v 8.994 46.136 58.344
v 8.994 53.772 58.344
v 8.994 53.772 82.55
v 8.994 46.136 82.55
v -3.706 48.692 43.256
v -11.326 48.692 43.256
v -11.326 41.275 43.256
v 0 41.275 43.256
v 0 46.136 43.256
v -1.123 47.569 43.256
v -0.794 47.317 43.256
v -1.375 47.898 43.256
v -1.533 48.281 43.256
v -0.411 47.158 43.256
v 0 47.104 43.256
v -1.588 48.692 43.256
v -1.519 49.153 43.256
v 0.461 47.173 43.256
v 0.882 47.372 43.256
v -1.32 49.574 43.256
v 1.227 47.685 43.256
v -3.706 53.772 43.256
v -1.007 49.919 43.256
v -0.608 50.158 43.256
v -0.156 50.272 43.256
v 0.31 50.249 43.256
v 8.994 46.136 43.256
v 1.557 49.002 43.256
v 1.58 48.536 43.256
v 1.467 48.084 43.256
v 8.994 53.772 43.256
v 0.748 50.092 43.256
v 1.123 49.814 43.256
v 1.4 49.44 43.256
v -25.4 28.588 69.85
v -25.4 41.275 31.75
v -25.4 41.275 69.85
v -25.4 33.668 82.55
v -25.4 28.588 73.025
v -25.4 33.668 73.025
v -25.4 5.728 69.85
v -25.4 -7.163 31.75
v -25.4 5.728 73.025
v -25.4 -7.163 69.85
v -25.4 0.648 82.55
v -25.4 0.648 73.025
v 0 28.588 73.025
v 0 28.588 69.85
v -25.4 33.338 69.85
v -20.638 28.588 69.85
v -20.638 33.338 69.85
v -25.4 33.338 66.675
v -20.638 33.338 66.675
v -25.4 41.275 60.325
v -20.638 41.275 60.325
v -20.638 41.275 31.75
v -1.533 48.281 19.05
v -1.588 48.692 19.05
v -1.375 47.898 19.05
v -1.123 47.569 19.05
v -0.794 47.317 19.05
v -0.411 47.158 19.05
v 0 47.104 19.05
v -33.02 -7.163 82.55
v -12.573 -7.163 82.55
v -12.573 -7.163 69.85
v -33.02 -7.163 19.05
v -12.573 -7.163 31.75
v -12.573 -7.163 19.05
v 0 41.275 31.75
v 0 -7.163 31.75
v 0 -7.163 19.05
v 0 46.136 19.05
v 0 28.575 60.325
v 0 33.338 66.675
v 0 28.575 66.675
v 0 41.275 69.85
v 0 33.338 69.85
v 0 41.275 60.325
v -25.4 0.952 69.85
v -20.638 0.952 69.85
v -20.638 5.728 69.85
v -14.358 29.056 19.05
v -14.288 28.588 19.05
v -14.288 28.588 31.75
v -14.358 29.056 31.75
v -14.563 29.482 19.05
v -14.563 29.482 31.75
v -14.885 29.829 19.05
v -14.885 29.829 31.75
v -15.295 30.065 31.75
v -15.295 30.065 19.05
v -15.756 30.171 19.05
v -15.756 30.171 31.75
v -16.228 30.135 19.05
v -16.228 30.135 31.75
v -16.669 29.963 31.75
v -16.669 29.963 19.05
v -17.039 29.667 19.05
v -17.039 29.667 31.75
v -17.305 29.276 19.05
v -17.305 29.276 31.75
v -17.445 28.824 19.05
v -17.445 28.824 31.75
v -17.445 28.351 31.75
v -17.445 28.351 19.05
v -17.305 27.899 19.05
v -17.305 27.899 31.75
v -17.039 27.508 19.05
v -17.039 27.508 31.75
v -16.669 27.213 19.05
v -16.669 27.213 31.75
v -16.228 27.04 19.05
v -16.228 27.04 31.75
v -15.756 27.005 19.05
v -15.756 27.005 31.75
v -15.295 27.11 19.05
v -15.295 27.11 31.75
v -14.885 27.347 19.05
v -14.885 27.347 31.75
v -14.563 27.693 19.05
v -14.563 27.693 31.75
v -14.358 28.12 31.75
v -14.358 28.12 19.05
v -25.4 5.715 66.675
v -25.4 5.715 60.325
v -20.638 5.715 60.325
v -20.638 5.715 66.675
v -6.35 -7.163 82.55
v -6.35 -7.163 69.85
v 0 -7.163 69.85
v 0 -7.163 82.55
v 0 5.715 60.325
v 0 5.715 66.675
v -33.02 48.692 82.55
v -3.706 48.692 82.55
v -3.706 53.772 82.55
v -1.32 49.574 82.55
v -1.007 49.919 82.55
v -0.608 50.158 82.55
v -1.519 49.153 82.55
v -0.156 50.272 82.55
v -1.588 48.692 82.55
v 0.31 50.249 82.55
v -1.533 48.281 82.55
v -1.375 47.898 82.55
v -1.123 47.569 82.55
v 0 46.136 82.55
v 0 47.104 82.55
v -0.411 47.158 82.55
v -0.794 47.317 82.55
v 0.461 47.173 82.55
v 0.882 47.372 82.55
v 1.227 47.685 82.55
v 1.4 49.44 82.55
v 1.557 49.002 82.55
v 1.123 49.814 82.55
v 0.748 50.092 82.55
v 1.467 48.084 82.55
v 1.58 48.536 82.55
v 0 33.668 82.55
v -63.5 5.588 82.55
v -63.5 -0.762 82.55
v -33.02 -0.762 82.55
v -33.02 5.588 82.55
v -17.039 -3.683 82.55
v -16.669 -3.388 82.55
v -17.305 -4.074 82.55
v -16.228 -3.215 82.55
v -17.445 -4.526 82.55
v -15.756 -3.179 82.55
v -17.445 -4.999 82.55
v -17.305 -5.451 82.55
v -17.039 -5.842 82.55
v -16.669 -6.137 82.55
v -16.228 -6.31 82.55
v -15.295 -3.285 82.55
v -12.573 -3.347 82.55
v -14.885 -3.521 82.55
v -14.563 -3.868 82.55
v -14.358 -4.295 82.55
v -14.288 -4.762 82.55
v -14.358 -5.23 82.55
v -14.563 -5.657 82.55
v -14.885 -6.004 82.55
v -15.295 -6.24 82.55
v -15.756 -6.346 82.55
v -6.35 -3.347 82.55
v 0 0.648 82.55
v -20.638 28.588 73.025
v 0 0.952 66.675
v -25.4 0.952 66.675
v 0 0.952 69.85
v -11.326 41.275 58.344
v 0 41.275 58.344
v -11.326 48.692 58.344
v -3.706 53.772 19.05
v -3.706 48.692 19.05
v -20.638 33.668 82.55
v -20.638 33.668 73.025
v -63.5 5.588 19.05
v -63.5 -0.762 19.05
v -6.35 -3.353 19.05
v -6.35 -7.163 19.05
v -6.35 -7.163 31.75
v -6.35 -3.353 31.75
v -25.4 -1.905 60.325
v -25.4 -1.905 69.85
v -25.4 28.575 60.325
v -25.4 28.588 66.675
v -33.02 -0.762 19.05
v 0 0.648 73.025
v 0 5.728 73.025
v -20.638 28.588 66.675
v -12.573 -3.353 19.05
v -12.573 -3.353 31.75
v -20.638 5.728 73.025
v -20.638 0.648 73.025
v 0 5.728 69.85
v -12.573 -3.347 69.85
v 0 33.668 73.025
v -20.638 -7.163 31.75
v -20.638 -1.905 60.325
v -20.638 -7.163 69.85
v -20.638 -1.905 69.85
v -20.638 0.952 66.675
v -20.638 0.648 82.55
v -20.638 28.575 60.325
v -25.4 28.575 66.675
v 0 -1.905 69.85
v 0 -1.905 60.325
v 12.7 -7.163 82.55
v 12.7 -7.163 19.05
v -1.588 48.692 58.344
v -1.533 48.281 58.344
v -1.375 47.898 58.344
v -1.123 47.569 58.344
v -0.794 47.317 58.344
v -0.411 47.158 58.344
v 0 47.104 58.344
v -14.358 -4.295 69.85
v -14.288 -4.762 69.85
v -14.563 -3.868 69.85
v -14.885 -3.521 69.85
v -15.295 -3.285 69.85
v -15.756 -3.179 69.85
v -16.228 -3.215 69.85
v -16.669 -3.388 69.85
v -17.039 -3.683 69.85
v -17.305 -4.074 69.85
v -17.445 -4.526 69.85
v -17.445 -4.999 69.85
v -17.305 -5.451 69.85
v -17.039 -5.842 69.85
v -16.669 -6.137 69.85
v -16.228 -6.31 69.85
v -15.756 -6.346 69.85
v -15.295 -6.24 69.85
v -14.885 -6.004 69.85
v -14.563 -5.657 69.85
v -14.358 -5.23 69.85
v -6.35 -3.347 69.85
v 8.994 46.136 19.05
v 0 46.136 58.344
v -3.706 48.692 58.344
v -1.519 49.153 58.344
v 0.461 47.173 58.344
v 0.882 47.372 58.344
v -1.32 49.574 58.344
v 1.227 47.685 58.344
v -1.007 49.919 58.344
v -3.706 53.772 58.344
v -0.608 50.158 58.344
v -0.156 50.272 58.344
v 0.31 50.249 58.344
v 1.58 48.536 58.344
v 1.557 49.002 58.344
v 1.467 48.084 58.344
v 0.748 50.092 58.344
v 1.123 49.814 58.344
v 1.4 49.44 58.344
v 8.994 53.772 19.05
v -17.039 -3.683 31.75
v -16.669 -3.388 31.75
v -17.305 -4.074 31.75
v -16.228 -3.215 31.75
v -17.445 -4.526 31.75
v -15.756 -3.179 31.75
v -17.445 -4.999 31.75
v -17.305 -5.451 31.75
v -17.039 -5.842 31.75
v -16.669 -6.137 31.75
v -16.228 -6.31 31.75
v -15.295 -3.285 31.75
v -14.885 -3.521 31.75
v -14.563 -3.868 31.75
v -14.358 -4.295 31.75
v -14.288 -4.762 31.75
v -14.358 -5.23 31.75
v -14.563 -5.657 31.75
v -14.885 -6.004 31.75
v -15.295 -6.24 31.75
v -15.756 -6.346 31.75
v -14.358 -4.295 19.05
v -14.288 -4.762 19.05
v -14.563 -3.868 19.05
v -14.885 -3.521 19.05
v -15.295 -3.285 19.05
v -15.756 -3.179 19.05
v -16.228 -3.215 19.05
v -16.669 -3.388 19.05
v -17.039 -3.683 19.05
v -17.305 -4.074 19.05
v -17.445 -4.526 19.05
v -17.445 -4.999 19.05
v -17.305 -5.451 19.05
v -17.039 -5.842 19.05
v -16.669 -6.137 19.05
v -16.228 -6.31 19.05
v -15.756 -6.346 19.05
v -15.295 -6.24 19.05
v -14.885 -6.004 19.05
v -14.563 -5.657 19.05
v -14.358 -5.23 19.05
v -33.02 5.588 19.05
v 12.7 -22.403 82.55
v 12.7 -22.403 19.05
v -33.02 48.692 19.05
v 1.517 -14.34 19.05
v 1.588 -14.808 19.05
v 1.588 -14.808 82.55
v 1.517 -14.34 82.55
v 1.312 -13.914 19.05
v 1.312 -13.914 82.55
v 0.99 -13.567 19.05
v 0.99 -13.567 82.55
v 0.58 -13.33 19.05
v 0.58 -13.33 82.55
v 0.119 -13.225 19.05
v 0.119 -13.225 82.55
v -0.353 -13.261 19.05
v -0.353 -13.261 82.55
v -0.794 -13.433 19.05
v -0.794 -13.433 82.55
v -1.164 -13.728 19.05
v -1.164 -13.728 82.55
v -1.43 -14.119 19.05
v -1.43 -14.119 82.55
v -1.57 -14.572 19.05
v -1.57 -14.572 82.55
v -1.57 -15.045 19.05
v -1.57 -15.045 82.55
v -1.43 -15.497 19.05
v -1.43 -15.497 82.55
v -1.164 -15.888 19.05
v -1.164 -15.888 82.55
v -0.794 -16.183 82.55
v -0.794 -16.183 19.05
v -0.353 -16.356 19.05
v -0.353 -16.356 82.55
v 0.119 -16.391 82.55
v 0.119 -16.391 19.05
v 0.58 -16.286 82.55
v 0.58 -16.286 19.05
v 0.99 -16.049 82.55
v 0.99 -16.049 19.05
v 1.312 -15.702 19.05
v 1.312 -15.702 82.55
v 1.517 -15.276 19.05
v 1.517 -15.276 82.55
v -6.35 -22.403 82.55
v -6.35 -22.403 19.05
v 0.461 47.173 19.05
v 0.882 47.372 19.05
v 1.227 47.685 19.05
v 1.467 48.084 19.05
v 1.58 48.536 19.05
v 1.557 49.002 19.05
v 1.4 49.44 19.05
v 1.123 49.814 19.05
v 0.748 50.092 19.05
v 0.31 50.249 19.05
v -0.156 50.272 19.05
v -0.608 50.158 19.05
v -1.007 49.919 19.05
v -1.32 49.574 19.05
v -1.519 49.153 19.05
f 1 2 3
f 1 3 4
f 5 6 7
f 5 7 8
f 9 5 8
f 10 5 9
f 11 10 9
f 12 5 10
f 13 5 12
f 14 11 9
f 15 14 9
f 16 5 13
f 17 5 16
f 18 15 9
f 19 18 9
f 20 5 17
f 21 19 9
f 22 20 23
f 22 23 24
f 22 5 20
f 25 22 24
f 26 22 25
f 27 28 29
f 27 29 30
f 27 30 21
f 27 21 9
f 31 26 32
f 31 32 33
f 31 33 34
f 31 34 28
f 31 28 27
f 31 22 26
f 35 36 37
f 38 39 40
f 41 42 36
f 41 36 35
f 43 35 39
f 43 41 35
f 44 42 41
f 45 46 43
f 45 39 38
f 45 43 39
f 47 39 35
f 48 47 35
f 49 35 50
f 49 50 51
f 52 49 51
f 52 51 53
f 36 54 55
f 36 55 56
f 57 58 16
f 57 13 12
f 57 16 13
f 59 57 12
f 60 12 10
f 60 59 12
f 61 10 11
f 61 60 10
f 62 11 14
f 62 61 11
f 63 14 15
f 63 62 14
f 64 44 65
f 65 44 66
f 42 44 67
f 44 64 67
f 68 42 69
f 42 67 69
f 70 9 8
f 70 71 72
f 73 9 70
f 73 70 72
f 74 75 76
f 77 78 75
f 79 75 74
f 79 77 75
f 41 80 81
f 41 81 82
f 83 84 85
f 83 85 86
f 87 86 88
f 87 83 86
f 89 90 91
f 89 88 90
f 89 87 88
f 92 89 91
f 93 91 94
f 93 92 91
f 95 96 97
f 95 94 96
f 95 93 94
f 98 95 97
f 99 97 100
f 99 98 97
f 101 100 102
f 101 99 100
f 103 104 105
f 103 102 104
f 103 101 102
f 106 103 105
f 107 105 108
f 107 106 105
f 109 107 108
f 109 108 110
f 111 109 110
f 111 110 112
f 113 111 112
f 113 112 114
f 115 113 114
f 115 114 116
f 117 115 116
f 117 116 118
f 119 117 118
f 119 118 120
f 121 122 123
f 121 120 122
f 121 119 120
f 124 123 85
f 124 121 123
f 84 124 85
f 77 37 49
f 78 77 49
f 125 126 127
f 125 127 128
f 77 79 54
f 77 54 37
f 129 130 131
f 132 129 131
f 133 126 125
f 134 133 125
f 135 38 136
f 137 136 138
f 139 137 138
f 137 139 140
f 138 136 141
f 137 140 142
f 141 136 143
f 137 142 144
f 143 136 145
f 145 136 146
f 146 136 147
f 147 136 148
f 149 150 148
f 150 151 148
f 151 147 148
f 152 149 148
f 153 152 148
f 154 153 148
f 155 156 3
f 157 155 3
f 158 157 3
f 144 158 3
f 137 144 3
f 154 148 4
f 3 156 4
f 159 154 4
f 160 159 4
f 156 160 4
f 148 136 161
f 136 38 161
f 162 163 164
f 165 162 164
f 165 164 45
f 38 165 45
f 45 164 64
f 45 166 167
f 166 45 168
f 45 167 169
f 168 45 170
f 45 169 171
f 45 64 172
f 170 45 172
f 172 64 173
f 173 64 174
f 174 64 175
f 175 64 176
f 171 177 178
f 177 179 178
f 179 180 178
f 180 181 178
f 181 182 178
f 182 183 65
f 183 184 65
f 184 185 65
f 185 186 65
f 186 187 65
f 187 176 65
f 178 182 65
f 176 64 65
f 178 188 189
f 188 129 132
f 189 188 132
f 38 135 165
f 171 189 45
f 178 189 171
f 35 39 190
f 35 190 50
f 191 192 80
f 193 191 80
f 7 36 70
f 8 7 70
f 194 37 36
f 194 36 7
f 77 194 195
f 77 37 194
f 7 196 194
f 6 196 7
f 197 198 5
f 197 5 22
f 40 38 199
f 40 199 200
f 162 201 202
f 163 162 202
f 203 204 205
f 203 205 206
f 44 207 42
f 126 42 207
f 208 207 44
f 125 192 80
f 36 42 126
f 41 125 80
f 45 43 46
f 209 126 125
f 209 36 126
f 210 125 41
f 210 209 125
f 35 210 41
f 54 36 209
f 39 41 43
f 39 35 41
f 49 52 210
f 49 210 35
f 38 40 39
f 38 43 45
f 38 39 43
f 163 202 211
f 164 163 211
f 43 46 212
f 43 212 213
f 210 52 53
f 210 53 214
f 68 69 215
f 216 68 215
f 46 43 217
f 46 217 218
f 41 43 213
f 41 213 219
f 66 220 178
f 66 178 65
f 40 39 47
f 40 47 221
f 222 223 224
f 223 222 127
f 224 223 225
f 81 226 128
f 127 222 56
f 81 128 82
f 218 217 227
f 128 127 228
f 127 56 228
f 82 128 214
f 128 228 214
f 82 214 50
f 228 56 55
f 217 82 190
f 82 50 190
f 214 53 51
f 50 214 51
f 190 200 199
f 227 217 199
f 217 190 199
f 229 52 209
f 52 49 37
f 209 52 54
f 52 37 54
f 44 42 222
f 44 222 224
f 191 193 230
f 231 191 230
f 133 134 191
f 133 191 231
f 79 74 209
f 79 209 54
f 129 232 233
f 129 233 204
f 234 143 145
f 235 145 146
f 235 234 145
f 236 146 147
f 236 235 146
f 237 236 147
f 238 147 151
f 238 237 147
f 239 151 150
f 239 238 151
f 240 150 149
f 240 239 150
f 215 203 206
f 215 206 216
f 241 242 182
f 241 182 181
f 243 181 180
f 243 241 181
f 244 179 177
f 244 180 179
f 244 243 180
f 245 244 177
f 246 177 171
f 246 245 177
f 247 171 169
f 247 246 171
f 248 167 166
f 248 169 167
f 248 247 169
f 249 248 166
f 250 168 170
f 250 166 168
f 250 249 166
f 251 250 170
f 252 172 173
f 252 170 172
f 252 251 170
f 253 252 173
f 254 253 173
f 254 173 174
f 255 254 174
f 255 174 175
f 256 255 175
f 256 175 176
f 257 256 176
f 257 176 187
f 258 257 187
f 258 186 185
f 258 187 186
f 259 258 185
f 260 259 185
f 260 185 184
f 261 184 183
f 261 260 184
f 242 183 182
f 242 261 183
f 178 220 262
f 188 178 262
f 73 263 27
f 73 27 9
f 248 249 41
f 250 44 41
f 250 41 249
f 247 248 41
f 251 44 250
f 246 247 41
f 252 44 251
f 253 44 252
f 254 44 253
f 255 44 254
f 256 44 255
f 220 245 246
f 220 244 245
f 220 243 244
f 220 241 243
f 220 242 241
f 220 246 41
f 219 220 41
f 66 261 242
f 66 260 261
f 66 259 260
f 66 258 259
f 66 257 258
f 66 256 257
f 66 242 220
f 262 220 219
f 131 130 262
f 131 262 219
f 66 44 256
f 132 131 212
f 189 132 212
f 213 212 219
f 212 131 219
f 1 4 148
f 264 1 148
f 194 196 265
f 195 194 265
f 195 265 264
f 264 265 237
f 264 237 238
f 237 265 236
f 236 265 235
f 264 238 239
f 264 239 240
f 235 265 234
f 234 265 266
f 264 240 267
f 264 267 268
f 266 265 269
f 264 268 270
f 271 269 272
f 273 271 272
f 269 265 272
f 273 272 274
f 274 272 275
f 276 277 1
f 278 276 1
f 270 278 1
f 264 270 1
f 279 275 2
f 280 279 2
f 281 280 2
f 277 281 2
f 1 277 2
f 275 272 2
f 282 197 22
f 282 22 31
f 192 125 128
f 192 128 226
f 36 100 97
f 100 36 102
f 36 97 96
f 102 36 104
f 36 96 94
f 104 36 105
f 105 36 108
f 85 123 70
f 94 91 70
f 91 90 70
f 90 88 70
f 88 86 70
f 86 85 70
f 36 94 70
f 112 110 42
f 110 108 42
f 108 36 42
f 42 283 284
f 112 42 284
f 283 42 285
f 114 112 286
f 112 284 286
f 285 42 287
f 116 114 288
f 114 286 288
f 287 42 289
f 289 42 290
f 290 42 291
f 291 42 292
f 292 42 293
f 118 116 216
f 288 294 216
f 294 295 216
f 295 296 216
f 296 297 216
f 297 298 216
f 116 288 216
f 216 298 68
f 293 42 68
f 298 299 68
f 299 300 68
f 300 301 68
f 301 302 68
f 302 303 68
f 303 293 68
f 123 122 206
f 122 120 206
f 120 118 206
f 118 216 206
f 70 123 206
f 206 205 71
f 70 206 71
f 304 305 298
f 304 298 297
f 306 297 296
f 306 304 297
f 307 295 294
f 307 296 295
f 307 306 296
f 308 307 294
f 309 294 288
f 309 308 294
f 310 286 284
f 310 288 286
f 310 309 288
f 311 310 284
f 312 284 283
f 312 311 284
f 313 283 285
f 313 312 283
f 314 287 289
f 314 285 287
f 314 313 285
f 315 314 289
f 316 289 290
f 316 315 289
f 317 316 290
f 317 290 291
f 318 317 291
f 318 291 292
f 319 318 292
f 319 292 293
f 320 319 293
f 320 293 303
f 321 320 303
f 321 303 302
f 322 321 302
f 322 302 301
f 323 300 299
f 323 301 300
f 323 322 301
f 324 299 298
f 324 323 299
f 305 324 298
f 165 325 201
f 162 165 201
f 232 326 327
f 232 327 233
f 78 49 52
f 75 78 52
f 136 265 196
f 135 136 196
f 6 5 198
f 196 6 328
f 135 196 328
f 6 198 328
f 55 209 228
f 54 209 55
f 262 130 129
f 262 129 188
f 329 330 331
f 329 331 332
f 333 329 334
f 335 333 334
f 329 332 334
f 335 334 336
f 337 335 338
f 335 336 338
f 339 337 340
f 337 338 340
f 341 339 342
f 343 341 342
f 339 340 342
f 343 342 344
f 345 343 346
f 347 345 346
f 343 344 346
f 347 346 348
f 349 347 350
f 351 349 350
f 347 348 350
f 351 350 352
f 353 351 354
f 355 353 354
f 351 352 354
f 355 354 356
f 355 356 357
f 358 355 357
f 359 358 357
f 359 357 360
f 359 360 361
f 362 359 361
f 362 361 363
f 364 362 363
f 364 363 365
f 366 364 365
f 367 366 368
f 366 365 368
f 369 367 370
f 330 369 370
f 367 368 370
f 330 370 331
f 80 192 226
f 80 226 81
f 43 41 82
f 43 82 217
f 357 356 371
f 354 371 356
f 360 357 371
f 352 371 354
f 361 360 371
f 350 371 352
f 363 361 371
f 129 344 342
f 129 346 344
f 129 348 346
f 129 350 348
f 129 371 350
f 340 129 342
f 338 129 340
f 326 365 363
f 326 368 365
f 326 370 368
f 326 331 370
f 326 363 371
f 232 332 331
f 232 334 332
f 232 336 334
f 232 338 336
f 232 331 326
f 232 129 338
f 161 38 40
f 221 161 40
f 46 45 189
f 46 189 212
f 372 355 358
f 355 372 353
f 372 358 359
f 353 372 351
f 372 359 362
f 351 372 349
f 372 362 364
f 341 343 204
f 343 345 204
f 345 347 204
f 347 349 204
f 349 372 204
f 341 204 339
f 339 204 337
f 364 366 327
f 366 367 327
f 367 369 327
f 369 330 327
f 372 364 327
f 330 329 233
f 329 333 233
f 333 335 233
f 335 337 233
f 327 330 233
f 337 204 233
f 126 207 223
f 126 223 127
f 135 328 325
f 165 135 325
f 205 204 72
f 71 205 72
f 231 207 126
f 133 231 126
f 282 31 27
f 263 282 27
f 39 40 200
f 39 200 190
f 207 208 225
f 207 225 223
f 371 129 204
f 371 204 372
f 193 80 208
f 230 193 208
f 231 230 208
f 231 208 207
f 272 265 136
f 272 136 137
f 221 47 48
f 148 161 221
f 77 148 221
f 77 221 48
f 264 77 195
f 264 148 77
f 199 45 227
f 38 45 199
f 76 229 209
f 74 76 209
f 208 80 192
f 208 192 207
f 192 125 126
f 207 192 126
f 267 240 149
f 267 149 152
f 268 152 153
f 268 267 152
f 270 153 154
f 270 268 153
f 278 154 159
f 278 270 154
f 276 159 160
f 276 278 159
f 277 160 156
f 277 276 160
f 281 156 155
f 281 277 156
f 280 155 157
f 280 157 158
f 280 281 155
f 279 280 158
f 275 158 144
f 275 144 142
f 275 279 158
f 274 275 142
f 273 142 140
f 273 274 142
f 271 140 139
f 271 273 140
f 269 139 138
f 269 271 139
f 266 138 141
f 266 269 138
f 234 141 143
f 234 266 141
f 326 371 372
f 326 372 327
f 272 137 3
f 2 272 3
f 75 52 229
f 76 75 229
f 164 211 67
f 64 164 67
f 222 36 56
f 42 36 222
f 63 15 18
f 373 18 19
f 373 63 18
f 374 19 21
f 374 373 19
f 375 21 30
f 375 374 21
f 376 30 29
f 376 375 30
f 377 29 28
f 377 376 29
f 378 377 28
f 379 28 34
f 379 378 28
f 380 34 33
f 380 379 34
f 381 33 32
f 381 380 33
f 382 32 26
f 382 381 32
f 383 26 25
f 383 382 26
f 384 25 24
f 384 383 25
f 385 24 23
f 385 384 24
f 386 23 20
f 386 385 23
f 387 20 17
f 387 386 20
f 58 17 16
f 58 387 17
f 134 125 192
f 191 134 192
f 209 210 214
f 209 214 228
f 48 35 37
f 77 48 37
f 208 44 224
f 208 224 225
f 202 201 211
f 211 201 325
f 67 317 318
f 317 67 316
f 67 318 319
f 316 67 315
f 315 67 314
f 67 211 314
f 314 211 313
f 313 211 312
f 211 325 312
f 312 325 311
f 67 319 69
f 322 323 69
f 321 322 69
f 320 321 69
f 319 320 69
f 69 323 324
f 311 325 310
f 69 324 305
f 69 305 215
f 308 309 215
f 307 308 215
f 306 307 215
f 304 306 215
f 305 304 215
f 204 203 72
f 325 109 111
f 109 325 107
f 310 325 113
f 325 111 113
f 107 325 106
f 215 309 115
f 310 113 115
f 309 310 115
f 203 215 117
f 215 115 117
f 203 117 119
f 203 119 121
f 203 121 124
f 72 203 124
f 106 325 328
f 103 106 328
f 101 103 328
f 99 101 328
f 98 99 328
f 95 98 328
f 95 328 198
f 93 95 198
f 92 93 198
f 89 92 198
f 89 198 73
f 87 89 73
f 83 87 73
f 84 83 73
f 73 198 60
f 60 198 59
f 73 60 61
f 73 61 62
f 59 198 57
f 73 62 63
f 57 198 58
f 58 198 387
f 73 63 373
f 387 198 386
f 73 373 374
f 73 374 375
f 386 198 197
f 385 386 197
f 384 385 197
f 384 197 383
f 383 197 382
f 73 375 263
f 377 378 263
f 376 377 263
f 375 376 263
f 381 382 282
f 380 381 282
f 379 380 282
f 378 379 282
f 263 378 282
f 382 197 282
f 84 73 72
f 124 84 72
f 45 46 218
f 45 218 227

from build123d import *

# Parameters (mm, degrees)
SKETCH8_R                = 1.5875
BOSS_EXTRUDE3_DEPTH      = 101.6
SKETCH40_W               = 25.4
SKETCH40_H               = 38.1
CUT_EXTRUDE24_DEPTH      = 50.8
CUT_EXTRUDE11_DEPTH      = 130.327883255
CUT_EXTRUDE11_DEPTH_BACK = 101.6
SKETCH18_W               = 33.02
SKETCH18_H               = 2.3622
BOSS_EXTRUDE4_DEPTH      = 101.6
CUT_EXTRUDE12_START      = -101.6
SKETCH20_R               = 1.5875
CUT_EXTRUDE12_DEPTH      = 101.6
SKETCH21_W               = 33.02
SKETCH21_H               = 19.05
CUT_EXTRUDE13_DEPTH      = 135.416648809
SKETCH24_W               = 8.993546066
SKETCH24_H               = 19.05
CUT_EXTRUDE15_DEPTH      = 135.416648809
SKETCH38_W               = 15.0876
SKETCH38_H               = 7.635884817
CUT_EXTRUDE21_DEPTH      = 20.32
SKETCH41_W               = 30.48
SKETCH41_H               = 19.05
CUT_EXTRUDE25_DEPTH      = 130.137479387
SKETCH43_W               = 12.7
SKETCH43_H               = 33.02
CUT_EXTRUDE26_DEPTH      = 25.4
SKETCH44_W               = 3.175
SKETCH44_H               = 5.08
BOSS_EXTRUDE5_DEPTH      = 25.4
BOSS_EXTRUDE6_DEPTH      = 25.4
BOSS_EXTRUDE6_2_DEPTH    = 25.4
SKETCH46_R               = 1.5875
BOSS_EXTRUDE7_DEPTH      = 63.5
CUT_EXTRUDE29_DEPTH      = 105.670466108
CUT_EXTRUDE29_DEPTH_BACK = 12.7
SKETCH49_W               = 6.223
SKETCH49_H               = 3.81
CUT_EXTRUDE31_DEPTH      = 12.7
SKETCH50_W               = 11.326453934
SKETCH50_H               = 15.0876
CUT_EXTRUDE33_DEPTH      = 4.8768
BOSS_EXTRUDE8_DEPTH      = 4.7625


with BuildPart() as part:
    # Sketch8 → Boss-Extrude3 (new body)
    with BuildSketch(Plane.XY):
        Polygon((0, 0), (0, 48.6918), (-33.02, 48.6918), (-33.02, 5.588), (-63.5, 5.588), (-63.5, -0.762), (-33.02, -0.762), (-33.02, -9.525), (-9.525, -9.525), (0, -9.525), align=None)
        with Locations((-15.875, 28.5877)):
            Circle(SKETCH8_R, mode=Mode.SUBTRACT)
        with Locations((-15.875, -4.7625)):
            Circle(SKETCH8_R, mode=Mode.SUBTRACT)
    extrude(amount=BOSS_EXTRUDE3_DEPTH)

    # Sketch40 → Cut-Extrude24 (cut)
    with BuildSketch(Plane.XZ.offset(9.525)):
        with Locations((-12.7, 50.8)):
            Rectangle(SKETCH40_W, SKETCH40_H)
    extrude(amount=-CUT_EXTRUDE24_DEPTH, mode=Mode.SUBTRACT)

    # Sketch18 → Cut-Extrude11 (cut, two sides: drawn at the far end of the back side and taken through both)
    with BuildSketch(Plane.XY.offset(101.6).offset(-CUT_EXTRUDE11_DEPTH_BACK)):
        with Locations((-16.51, -8.3439)):
            Rectangle(SKETCH18_W, SKETCH18_H)
    extrude(amount=CUT_EXTRUDE11_DEPTH + CUT_EXTRUDE11_DEPTH_BACK, mode=Mode.SUBTRACT)

    # Sketch19 → Boss-Extrude4 (add)
    with BuildSketch(Plane(origin=(0, 0, 0), x_dir=(-1, 0, 0), z_dir=(0, 0, -1))):
        with BuildLine():
            Line((1.5875, 48.6918), (3.706453934, 48.6918))
            Line((3.706453934, 48.6918), (3.706453934, 53.7718))
            Line((3.706453934, 53.7718), (-8.993546066, 53.7718))
            Line((-8.993546066, 53.7718), (-8.993546066, 46.135915183))
            Line((-8.993546066, 46.135915183), (0, 46.135915183))
            Line((0, 46.135915183), (0, 47.1043))
            ThreePointArc((0, 47.1043), (-1.122532015, 49.814332015), (1.5875, 48.6918))
        make_face()
    extrude(amount=-BOSS_EXTRUDE4_DEPTH)

    # Sketch20 → Cut-Extrude12 (cut)
    with BuildSketch(Plane.XY.offset(101.6).offset(CUT_EXTRUDE12_START)):
        with Locations(Location((0, 48.6918, 0), (0, 0, 180))):
            Circle(SKETCH20_R)
    extrude(amount=CUT_EXTRUDE12_DEPTH, mode=Mode.SUBTRACT)

    # Sketch21 → Cut-Extrude13 (cut, through all)
    with BuildSketch(Plane.XZ.offset(7.1628)):
        with Locations((-16.51, 92.075)):
            Rectangle(SKETCH21_W, SKETCH21_H)
        with Locations((-16.51, 9.525)):
            Rectangle(SKETCH21_W, SKETCH21_H)
    extrude(amount=-CUT_EXTRUDE13_DEPTH, mode=Mode.SUBTRACT)

    # Sketch24 → Cut-Extrude15 (cut, through all)
    with BuildSketch(Plane(origin=(0, 53.7718, 0), x_dir=(1, 0, 0), z_dir=(0, 1, 0))):
        with Locations((4.496773033, -92.075)):
            Rectangle(SKETCH24_W, SKETCH24_H)
        with Locations((4.496773033, -9.525)):
            Rectangle(SKETCH24_W, SKETCH24_H)
    extrude(amount=-CUT_EXTRUDE15_DEPTH, mode=Mode.SUBTRACT)

    # Sketch38 → Cut-Extrude21 (cut)
    with BuildSketch(Plane(origin=(8.993546066, 0, 0), x_dir=(0, 0, -1), z_dir=(1, 0, 0))):
        with Locations((-50.8, 49.953857592)):
            Rectangle(SKETCH38_W, SKETCH38_H)
    extrude(amount=-CUT_EXTRUDE21_DEPTH, mode=Mode.SUBTRACT)

    # Sketch41 → Cut-Extrude25 (cut, through all)
    with BuildSketch(Plane(origin=(0, 5.588, 0), x_dir=(1, 0, 0), z_dir=(0, 1, 0))):
        with Locations((-48.26, -9.525)):
            Rectangle(SKETCH41_W, SKETCH41_H)
        with Locations((-48.26, -92.075)):
            Rectangle(SKETCH41_W, SKETCH41_H)
    extrude(amount=-CUT_EXTRUDE25_DEPTH, mode=Mode.SUBTRACT)

    # Sketch43 → Cut-Extrude26 (cut)
    with BuildSketch(Plane(origin=(0, 0, 0), x_dir=(0, 0, -1), z_dir=(1, 0, 0))):
        with Locations((-76.2, 17.1577)):
            Rectangle(SKETCH43_W, SKETCH43_H)
    extrude(amount=-CUT_EXTRUDE26_DEPTH, mode=Mode.SUBTRACT)

    # Sketch44 → Boss-Extrude5 (add)
    with BuildSketch(Plane(origin=(-25.4, 0, 0), x_dir=(0, 0, -1), z_dir=(1, 0, 0))):
        with Locations((-71.4375, 31.1277)):
            Rectangle(SKETCH44_W, SKETCH44_H)
        with Locations((-71.4375, 3.1877)):
            Rectangle(SKETCH44_W, SKETCH44_H)
    extrude(amount=BOSS_EXTRUDE5_DEPTH)

    # Sketch48 → Cut-Extrude29 (cut, two sides: drawn at the far end of the back side and taken through both)
    with BuildSketch(Plane.XY.offset(82.55).offset(-CUT_EXTRUDE29_DEPTH_BACK)):
        Polygon((-12.573, -184.245390082), (-12.573, -7.1628), (-12.573, -3.346799078), (-6.35, -3.346799078), (-6.35, -7.1628), (-6.35, -184.245390082), (-6.35, -538.410570247), (-12.573, -538.410570247), align=None)
    extrude(amount=CUT_EXTRUDE29_DEPTH + CUT_EXTRUDE29_DEPTH_BACK, mode=Mode.SUBTRACT)

    # Sketch49 → Cut-Extrude31 (cut)
    with BuildSketch(Plane(origin=(0, 0, 19.05), x_dir=(-1, 0, 0), z_dir=(0, 0, -1))):
        with Locations((9.4615, -5.2578)):
            Rectangle(SKETCH49_W, SKETCH49_H)
    extrude(amount=-CUT_EXTRUDE31_DEPTH, mode=Mode.SUBTRACT)

    # Sketch50 → Cut-Extrude33 (cut)
    with BuildSketch(Plane(origin=(0, 46.135915183, 0), x_dir=(1, 0, 0), z_dir=(0, 1, 0))):
        with Locations((-5.663226967, -50.8)):
            Rectangle(SKETCH50_W, SKETCH50_H)
    extrude(amount=-CUT_EXTRUDE33_DEPTH, mode=Mode.SUBTRACT)


with BuildPart() as body_2:
    # Sketch45 → Boss-Extrude6 (new body)
    with BuildSketch(Plane(origin=(-25.4, 0, 0), x_dir=(0, 0, -1), z_dir=(1, 0, 0))):
        Polygon((-60.325, -1.905), (-60.325, 5.715), (-66.675, 5.715), (-66.675, 0.9525), (-69.85, 0.9525), (-69.85, -1.905), align=None)
    extrude(amount=BOSS_EXTRUDE6_DEPTH)


with BuildPart() as body_3:
    # Sketch45 → Boss-Extrude6 2 (new body)
    with BuildSketch(Plane(origin=(-25.4, 0, 0), x_dir=(0, 0, -1), z_dir=(1, 0, 0))):
        Polygon((-60.325, 41.275), (-69.85, 41.275), (-69.85, 33.3375), (-66.675, 33.3375), (-66.675, 28.575), (-60.325, 28.575), align=None)
    extrude(amount=BOSS_EXTRUDE6_2_DEPTH)


with BuildPart() as body_4:
    # Sketch46 → Boss-Extrude7 (new body)
    with BuildSketch(Plane.XY.offset(82.55)):
        Polygon((12.7, -7.1628), (0, -7.1628), (-6.35, -7.1628), (-6.35, -22.4028), (12.7, -22.4028), align=None)
        with Locations((0, -14.8082)):
            Circle(SKETCH46_R, mode=Mode.SUBTRACT)
    extrude(amount=-BOSS_EXTRUDE7_DEPTH)


with BuildPart() as body_5:
    # Sketch52 → Boss-Extrude8 (new body)
    with BuildSketch(Plane(origin=(-25.4, 0, 0), x_dir=(0, 0, -1), z_dir=(1, 0, 0))):
        Polygon((-82.55, 33.6677), (-73.025, 33.6677), (-73.025, 28.5877), (-69.85, 28.5877), (-69.85, 33.3375), (-66.675, 33.3375), (-66.675, 28.5877), (-60.325, 28.575), (-60.325, 41.275), (-31.75, 41.275), (-31.75, -7.1628), (-69.85, -7.1628), (-69.85, -1.905), (-60.325, -1.905), (-60.325, 5.715), (-66.675, 5.715), (-66.675, 0.9525), (-69.85, 0.9525), (-69.85, 5.7277), (-73.025, 5.7277), (-73.025, 0.6477), (-82.55, 0.6477), align=None)
    extrude(amount=BOSS_EXTRUDE8_DEPTH)


solid = Compound([part.part, body_2.part, body_3.part, body_4.part, body_5.part])
